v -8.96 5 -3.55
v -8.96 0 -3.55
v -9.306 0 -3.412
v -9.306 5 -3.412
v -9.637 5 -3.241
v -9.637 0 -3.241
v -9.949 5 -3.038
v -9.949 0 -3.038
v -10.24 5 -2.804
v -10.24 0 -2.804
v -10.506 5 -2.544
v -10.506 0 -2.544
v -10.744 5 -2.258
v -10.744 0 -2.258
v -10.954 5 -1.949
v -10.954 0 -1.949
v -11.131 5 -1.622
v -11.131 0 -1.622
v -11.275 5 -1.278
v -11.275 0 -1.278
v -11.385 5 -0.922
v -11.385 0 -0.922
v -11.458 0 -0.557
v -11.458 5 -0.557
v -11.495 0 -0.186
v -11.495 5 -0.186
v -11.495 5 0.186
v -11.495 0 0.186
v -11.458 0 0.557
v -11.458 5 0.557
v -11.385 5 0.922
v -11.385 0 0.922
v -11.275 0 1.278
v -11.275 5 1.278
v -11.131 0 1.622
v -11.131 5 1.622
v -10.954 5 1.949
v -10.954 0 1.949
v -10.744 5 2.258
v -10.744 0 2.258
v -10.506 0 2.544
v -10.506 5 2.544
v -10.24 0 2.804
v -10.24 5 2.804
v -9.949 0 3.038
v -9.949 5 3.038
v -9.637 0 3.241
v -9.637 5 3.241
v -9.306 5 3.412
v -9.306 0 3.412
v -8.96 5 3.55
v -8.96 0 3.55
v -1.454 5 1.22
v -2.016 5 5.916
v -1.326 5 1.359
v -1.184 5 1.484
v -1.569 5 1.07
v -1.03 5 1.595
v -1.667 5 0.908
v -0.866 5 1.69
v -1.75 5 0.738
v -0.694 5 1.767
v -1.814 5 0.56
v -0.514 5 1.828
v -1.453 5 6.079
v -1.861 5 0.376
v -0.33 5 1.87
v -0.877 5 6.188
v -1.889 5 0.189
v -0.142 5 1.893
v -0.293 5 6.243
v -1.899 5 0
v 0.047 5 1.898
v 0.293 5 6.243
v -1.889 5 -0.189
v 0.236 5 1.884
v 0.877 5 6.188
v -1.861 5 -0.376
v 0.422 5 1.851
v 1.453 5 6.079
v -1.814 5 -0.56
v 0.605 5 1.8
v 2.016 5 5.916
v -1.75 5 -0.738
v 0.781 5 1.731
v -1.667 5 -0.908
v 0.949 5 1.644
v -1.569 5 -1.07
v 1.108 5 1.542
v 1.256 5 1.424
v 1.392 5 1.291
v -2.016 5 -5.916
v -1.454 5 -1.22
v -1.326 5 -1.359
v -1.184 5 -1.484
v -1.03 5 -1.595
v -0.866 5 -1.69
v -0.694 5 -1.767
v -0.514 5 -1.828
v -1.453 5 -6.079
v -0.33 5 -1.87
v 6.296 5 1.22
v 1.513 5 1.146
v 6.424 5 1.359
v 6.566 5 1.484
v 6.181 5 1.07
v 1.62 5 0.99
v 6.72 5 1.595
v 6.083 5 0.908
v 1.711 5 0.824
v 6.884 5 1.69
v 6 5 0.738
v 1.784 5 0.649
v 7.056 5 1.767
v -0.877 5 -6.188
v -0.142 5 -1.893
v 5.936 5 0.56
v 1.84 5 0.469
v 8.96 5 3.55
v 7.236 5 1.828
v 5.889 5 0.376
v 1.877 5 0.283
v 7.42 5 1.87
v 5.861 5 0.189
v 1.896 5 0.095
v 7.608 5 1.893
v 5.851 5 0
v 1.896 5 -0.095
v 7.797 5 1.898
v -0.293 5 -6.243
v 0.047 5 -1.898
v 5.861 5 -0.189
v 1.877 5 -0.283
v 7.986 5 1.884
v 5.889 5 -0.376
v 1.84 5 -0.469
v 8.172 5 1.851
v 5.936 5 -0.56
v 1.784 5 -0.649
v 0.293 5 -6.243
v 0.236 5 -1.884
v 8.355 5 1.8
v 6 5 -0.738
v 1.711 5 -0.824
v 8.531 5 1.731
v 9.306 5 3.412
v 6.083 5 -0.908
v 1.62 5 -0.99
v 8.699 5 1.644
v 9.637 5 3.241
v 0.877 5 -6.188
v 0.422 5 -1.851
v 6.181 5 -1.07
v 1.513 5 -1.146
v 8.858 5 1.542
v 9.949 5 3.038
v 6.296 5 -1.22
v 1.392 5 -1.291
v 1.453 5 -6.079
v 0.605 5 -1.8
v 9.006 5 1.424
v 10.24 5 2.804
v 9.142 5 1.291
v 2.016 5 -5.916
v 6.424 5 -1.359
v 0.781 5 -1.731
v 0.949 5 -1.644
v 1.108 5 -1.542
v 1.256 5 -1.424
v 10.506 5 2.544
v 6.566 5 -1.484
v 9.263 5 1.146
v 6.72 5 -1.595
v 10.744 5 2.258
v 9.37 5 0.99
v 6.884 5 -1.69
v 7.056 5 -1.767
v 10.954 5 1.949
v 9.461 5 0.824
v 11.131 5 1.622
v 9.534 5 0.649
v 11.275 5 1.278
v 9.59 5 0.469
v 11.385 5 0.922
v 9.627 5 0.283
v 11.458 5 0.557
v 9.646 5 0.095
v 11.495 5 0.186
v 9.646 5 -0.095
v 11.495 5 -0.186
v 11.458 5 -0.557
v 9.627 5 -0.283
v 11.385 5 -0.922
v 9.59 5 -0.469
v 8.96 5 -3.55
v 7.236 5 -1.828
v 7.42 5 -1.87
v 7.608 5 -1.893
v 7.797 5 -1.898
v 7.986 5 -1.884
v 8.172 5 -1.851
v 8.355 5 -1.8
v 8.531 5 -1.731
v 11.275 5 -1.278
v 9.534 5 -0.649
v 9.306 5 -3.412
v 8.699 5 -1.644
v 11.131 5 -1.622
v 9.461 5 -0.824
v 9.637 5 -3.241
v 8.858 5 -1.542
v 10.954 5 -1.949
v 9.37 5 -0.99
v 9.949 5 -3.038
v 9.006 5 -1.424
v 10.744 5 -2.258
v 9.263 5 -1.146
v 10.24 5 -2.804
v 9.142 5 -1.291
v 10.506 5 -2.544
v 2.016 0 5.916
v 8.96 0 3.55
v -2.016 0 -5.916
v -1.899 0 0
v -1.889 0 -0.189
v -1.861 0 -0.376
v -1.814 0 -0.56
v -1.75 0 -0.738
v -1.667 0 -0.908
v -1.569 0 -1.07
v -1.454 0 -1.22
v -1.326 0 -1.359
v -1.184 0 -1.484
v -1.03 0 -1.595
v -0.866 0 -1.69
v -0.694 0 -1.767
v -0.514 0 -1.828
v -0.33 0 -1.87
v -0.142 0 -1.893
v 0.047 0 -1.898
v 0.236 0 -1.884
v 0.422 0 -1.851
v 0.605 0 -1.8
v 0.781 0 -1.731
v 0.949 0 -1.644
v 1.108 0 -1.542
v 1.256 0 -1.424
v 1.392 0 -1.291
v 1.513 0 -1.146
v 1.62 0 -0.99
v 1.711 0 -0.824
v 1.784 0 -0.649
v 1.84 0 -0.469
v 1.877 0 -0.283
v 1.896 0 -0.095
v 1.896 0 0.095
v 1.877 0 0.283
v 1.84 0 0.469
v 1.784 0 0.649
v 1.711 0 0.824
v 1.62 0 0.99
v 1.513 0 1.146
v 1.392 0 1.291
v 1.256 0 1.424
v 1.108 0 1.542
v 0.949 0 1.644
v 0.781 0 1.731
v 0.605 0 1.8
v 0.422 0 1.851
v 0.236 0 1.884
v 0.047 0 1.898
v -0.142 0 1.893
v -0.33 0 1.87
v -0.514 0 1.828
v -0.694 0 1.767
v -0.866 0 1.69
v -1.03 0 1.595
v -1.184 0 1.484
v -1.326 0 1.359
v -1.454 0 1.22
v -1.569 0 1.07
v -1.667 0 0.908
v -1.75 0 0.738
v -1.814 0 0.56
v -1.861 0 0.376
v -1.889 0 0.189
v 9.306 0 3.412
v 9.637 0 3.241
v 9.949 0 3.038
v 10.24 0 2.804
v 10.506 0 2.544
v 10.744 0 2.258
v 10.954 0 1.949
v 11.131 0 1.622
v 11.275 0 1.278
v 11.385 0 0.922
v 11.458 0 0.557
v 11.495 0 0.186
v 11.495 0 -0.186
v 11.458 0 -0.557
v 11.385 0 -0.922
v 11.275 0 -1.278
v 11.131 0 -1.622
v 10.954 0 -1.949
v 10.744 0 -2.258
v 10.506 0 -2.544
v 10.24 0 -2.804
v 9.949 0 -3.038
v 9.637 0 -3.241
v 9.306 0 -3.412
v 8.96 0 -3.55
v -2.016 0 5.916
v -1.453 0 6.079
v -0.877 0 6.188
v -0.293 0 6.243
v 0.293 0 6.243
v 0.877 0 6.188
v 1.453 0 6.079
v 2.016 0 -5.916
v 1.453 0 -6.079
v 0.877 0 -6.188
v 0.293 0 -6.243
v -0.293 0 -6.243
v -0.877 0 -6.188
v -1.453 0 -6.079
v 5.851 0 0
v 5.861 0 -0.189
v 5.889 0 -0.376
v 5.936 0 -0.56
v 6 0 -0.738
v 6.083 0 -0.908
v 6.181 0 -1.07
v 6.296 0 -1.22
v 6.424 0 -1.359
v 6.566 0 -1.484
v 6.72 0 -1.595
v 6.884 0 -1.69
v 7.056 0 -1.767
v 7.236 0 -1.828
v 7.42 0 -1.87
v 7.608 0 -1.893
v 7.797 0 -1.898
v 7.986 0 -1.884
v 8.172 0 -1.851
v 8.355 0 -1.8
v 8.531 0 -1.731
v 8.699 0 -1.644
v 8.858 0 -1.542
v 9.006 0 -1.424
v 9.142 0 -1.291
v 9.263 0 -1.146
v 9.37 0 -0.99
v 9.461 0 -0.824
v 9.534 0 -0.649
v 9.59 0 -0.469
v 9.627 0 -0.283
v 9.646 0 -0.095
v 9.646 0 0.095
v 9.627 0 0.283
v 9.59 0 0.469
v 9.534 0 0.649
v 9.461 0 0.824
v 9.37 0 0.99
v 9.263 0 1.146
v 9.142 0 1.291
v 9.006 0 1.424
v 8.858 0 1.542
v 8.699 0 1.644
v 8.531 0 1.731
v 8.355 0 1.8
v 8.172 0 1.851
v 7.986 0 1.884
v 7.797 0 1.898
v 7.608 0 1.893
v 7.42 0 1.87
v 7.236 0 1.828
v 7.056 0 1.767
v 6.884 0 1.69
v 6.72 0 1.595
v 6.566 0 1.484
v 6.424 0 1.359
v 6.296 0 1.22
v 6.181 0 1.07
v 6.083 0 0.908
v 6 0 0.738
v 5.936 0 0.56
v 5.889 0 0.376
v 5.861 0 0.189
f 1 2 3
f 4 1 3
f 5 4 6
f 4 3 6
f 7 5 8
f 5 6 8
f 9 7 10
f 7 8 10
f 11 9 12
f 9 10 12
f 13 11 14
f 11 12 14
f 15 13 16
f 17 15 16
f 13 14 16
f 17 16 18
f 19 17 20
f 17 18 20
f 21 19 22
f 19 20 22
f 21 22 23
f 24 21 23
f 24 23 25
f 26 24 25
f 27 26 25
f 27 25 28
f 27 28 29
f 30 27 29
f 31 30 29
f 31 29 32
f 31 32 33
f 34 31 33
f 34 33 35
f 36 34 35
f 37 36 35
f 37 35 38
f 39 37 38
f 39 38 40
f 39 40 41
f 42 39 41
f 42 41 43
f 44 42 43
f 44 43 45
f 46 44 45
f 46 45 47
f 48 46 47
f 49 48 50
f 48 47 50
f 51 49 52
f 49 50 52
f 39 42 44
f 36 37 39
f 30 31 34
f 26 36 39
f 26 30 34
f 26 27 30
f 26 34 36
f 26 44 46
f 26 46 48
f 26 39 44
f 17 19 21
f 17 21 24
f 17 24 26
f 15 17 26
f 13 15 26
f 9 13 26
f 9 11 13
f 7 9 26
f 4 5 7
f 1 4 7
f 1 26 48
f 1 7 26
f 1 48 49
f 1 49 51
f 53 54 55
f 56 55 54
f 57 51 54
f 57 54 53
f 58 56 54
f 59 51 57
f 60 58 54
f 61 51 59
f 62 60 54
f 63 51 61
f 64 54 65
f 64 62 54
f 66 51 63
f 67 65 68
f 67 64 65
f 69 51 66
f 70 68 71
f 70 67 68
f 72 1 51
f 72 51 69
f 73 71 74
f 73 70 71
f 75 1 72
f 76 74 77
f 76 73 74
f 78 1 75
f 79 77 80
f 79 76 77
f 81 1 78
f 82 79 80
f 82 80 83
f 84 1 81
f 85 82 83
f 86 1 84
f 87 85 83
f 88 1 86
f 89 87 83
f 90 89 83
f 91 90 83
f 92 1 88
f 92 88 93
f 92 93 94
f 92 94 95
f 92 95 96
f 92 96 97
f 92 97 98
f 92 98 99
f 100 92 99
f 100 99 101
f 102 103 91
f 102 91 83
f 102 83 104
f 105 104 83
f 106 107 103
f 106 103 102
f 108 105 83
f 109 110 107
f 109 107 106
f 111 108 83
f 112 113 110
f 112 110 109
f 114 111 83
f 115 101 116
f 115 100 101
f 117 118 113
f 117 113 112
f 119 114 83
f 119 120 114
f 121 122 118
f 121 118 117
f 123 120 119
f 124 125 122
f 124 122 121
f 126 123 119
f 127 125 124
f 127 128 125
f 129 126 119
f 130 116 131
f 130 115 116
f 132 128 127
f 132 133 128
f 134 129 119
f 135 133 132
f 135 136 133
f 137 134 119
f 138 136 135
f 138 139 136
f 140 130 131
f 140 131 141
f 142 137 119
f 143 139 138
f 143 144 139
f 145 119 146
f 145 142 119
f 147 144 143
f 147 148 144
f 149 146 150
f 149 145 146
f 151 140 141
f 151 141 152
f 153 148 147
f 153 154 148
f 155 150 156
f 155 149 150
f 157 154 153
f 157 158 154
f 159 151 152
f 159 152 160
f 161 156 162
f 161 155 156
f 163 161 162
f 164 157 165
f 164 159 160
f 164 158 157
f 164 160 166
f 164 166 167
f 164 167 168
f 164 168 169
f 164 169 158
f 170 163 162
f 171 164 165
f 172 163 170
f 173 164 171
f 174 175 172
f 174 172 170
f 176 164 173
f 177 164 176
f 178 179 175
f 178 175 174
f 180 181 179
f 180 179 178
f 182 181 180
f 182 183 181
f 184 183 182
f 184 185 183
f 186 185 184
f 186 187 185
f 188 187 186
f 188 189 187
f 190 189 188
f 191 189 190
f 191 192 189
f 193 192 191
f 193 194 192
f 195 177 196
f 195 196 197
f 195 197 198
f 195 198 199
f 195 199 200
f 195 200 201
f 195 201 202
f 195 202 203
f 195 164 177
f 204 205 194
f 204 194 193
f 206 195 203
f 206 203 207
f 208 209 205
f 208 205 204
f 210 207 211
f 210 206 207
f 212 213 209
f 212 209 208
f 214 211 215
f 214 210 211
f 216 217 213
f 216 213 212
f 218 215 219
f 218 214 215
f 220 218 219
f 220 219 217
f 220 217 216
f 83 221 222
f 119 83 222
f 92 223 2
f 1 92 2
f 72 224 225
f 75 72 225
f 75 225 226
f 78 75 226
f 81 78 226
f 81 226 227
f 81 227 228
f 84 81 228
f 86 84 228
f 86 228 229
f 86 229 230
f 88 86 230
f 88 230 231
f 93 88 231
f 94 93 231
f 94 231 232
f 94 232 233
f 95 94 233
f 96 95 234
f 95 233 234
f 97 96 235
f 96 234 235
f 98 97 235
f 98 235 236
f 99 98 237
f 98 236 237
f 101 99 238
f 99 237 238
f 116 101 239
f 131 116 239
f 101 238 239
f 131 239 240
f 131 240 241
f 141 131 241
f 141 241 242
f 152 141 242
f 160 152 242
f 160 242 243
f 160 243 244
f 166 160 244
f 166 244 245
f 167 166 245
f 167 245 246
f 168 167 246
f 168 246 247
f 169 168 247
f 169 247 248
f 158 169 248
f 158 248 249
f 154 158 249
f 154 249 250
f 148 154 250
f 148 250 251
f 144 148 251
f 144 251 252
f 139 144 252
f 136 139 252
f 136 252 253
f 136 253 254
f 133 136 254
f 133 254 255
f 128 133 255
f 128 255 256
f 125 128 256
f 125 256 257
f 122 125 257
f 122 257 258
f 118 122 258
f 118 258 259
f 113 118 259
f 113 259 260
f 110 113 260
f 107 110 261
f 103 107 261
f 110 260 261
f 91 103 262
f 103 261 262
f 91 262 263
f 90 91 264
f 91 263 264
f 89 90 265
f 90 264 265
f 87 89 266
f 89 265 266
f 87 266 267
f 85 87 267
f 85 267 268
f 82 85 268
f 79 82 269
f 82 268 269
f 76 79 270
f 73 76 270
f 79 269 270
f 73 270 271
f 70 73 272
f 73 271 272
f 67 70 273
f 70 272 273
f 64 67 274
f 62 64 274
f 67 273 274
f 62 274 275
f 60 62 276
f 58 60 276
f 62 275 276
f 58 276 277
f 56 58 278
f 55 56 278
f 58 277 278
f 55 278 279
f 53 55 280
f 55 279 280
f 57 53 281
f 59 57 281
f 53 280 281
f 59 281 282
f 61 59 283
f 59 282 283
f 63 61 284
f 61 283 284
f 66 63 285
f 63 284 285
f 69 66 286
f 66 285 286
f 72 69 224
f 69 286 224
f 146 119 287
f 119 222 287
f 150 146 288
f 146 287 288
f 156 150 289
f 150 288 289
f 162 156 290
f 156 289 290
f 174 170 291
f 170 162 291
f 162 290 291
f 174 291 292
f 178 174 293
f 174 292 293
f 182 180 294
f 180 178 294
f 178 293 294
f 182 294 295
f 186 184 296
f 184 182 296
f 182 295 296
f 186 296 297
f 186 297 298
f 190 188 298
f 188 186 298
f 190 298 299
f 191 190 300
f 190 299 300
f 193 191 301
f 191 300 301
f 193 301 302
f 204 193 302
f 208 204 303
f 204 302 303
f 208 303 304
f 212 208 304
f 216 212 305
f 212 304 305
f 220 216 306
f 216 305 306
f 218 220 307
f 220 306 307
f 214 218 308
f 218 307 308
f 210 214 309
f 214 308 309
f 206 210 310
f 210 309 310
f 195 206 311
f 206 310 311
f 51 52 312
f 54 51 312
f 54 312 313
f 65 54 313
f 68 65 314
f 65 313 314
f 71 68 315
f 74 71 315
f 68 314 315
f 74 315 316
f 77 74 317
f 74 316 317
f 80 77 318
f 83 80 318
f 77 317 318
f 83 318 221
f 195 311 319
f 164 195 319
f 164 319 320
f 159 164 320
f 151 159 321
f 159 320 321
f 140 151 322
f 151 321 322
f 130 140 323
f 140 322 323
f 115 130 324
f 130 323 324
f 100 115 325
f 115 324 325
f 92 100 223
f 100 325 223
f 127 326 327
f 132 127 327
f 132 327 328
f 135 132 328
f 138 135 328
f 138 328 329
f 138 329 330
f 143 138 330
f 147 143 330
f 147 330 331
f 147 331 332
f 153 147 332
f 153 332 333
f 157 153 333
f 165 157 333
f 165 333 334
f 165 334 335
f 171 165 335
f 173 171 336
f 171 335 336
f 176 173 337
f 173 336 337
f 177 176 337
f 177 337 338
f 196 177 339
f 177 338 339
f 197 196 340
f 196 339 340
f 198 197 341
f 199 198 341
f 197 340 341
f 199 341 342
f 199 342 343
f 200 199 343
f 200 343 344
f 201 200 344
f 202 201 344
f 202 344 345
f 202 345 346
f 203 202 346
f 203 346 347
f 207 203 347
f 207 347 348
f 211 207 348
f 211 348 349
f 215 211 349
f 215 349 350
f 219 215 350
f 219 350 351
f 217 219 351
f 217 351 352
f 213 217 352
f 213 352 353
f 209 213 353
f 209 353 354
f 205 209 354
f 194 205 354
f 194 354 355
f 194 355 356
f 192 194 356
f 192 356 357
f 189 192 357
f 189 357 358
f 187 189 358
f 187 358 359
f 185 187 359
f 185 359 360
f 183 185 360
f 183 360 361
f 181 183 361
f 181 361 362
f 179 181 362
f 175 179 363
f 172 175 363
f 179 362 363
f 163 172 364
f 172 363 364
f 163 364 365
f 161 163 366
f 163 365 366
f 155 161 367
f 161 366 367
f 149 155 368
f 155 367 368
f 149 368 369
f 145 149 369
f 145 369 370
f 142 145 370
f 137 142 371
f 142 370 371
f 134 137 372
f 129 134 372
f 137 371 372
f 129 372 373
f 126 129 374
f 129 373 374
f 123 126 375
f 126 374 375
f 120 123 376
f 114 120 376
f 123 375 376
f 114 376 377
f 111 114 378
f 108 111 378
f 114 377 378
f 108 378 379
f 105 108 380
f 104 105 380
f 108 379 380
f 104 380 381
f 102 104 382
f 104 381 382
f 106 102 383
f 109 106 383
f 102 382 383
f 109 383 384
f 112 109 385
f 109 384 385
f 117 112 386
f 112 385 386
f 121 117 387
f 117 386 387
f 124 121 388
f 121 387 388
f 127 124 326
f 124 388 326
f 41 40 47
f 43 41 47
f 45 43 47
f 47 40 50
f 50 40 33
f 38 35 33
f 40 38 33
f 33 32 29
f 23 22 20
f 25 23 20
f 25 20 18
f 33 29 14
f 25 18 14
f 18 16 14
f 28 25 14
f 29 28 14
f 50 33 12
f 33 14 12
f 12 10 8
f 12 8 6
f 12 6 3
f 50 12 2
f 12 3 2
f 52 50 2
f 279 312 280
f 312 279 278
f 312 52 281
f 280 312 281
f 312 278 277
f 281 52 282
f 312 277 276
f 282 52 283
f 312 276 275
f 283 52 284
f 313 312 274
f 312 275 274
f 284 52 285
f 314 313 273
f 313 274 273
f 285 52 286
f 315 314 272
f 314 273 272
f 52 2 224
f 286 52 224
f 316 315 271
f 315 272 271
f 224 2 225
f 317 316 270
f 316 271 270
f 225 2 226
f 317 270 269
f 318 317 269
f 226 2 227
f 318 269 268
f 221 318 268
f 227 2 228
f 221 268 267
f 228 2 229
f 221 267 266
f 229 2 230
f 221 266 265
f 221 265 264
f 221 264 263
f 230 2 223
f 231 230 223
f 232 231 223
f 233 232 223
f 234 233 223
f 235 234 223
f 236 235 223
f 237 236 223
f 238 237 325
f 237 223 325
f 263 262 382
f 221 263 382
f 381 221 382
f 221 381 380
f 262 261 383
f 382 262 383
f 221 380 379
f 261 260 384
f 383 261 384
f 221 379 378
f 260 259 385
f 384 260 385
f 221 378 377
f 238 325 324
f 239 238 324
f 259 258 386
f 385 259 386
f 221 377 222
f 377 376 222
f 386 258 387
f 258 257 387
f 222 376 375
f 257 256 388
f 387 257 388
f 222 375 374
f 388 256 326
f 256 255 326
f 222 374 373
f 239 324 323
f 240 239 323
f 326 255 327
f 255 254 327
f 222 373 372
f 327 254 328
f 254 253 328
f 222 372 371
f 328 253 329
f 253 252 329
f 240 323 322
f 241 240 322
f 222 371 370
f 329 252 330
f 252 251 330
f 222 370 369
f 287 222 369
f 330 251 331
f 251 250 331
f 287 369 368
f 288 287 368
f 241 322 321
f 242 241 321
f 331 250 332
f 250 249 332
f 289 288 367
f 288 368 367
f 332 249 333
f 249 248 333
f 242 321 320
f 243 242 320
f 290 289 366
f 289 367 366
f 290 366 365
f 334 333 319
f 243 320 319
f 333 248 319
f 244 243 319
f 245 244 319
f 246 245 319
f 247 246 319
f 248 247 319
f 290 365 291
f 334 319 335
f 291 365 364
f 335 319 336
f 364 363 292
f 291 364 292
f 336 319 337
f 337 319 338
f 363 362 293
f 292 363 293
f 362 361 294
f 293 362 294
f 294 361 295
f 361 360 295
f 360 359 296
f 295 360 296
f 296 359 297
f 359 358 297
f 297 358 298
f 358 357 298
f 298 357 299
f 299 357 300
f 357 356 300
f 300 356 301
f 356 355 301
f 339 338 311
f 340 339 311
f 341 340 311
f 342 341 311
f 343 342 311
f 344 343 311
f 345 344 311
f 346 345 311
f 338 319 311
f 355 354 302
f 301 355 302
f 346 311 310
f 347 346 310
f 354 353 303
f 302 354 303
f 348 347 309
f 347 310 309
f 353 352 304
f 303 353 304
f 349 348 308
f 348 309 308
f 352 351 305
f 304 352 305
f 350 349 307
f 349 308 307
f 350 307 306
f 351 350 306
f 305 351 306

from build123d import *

# Parameters (mm, degrees)
SKETCH1_R             = 6.25
SKETCH1_R_2           = 3.75
SKETCH1_R_3           = 2.5
BOSS_EXTRUDE1_DEPTH   = 5
F_6_CLEARANCE_HOLE1_D = 3.7973


with BuildPart() as part:
    # Sketch1 → Boss-Extrude1 (new body)
    # profile 1 of 15: a face of its own
    with BuildSketch(Plane(origin=(0, 0, 0), x_dir=(1, 0, 0), z_dir=(0, 1, 0))):
        Circle(SKETCH1_R)
    # profile 2 of 15: a face of its own
    with BuildSketch(Plane(origin=(0, 0, 0), x_dir=(1, 0, 0), z_dir=(0, 1, 0))):
        with Locations((-7.75, 0)):
            Circle(SKETCH1_R_2)
        with Locations((-7.75, 0)):
            Circle(SKETCH1_R_3, mode=Mode.SUBTRACT)
    # profile 3 of 15: a face of its own
    with BuildSketch(Plane(origin=(0, 0, 0), x_dir=(1, 0, 0), z_dir=(0, 1, 0))):
        Circle(SKETCH1_R)
    # profile 4 of 15: a face of its own
    with BuildSketch(Plane(origin=(0, 0, 0), x_dir=(1, 0, 0), z_dir=(0, 1, 0))):
        with Locations((-7.75, 0)):
            Circle(SKETCH1_R_2)
        with Locations((-7.75, 0)):
            Circle(SKETCH1_R_3, mode=Mode.SUBTRACT)
    # profile 5 of 15: a face of its own
    with BuildSketch(Plane(origin=(0, 0, 0), x_dir=(1, 0, 0), z_dir=(0, 1, 0))):
        with Locations((7.75, 0)):
            Circle(SKETCH1_R_2)
    # profile 6 of 15: a face of its own
    with BuildSketch(Plane(origin=(0, 0, 0), x_dir=(1, 0, 0), z_dir=(0, 1, 0))):
        Circle(SKETCH1_R)
    # profile 7 of 15: a face of its own
    with BuildSketch(Plane(origin=(0, 0, 0), x_dir=(1, 0, 0), z_dir=(0, 1, 0))):
        with Locations((-7.75, 0)):
            Circle(SKETCH1_R_2)
    # profile 8 of 15: a face of its own
    with BuildSketch(Plane(origin=(0, 0, 0), x_dir=(1, 0, 0), z_dir=(0, 1, 0))):
        with BuildLine():
            ThreePointArc((-5.487903226, -2.990889196), (-7.15425073, -3.702375293), (-8.959677419, -3.54953244))
            Line((-8.959677419, -3.54953244), (-2.016129032, -5.9158874))
            ThreePointArc((-2.016129032, -5.9158874), (-4.026975125, -4.77974595), (-5.487903226, -2.990889196))
        make_face()
    # profile 9 of 15: a face of its own
    with BuildSketch(Plane(origin=(0, 0, 0), x_dir=(1, 0, 0), z_dir=(0, 1, 0))):
        with BuildLine():
            ThreePointArc((5.487903226, -2.990889196), (4.026975125, -4.77974595), (2.016129032, -5.9158874))
            Line((2.016129032, -5.9158874), (8.959677419, -3.54953244))
            ThreePointArc((8.959677419, -3.54953244), (7.15425073, -3.702375293), (5.487903226, -2.990889196))
        make_face()
    # profile 10 of 15: a face of its own
    with BuildSketch(Plane(origin=(0, 0, 0), x_dir=(1, 0, 0), z_dir=(0, 1, 0))):
        Circle(SKETCH1_R)
    # profile 11 of 15: a face of its own
    with BuildSketch(Plane(origin=(0, 0, 0), x_dir=(1, 0, 0), z_dir=(0, 1, 0))):
        with Locations((7.75, 0)):
            Circle(SKETCH1_R_2)
        with Locations((7.75, 0)):
            Circle(SKETCH1_R_3, mode=Mode.SUBTRACT)
    # profile 12 of 15: a face of its own
    with BuildSketch(Plane(origin=(0, 0, 0), x_dir=(1, 0, 0), z_dir=(0, 1, 0))):
        with Locations((7.75, 0)):
            Circle(SKETCH1_R_2)
        with Locations((7.75, 0)):
            Circle(SKETCH1_R_3, mode=Mode.SUBTRACT)
    # profile 13 of 15: a face of its own
    with BuildSketch(Plane(origin=(0, 0, 0), x_dir=(1, 0, 0), z_dir=(0, 1, 0))):
        Circle(SKETCH1_R)
    # profile 14 of 15: a face of its own
    with BuildSketch(Plane(origin=(0, 0, 0), x_dir=(1, 0, 0), z_dir=(0, 1, 0))):
        with BuildLine():
            Line((8.959677419, 3.54953244), (2.016129032, 5.9158874))
            ThreePointArc((2.016129032, 5.9158874), (4.026975125, 4.77974595), (5.487903226, 2.990889196))
            ThreePointArc((5.487903226, 2.990889196), (7.15425073, 3.702375293), (8.959677419, 3.54953244))
        make_face()
    # profile 15 of 15: a face of its own
    with BuildSketch(Plane(origin=(0, 0, 0), x_dir=(1, 0, 0), z_dir=(0, 1, 0))):
        with BuildLine():
            Line((-2.016129032, 5.9158874), (-8.959677419, 3.54953244))
            ThreePointArc((-8.959677419, 3.54953244), (-7.15425073, 3.702375293), (-5.487903226, 2.990889196))
            ThreePointArc((-5.487903226, 2.990889196), (-4.026975125, 4.77974595), (-2.016129032, 5.9158874))
        make_face()
    extrude(amount=BOSS_EXTRUDE1_DEPTH)

    # #6 Clearance Hole1 (through all)
    with Locations(Plane(origin=(0, 5, 0), x_dir=(1, 0, 0), z_dir=(0, 1, 0))):
        with Locations((7.75, 0), (0, 0)):
            Hole(F_6_CLEARANCE_HOLE1_D / 2)


solid = part.part
